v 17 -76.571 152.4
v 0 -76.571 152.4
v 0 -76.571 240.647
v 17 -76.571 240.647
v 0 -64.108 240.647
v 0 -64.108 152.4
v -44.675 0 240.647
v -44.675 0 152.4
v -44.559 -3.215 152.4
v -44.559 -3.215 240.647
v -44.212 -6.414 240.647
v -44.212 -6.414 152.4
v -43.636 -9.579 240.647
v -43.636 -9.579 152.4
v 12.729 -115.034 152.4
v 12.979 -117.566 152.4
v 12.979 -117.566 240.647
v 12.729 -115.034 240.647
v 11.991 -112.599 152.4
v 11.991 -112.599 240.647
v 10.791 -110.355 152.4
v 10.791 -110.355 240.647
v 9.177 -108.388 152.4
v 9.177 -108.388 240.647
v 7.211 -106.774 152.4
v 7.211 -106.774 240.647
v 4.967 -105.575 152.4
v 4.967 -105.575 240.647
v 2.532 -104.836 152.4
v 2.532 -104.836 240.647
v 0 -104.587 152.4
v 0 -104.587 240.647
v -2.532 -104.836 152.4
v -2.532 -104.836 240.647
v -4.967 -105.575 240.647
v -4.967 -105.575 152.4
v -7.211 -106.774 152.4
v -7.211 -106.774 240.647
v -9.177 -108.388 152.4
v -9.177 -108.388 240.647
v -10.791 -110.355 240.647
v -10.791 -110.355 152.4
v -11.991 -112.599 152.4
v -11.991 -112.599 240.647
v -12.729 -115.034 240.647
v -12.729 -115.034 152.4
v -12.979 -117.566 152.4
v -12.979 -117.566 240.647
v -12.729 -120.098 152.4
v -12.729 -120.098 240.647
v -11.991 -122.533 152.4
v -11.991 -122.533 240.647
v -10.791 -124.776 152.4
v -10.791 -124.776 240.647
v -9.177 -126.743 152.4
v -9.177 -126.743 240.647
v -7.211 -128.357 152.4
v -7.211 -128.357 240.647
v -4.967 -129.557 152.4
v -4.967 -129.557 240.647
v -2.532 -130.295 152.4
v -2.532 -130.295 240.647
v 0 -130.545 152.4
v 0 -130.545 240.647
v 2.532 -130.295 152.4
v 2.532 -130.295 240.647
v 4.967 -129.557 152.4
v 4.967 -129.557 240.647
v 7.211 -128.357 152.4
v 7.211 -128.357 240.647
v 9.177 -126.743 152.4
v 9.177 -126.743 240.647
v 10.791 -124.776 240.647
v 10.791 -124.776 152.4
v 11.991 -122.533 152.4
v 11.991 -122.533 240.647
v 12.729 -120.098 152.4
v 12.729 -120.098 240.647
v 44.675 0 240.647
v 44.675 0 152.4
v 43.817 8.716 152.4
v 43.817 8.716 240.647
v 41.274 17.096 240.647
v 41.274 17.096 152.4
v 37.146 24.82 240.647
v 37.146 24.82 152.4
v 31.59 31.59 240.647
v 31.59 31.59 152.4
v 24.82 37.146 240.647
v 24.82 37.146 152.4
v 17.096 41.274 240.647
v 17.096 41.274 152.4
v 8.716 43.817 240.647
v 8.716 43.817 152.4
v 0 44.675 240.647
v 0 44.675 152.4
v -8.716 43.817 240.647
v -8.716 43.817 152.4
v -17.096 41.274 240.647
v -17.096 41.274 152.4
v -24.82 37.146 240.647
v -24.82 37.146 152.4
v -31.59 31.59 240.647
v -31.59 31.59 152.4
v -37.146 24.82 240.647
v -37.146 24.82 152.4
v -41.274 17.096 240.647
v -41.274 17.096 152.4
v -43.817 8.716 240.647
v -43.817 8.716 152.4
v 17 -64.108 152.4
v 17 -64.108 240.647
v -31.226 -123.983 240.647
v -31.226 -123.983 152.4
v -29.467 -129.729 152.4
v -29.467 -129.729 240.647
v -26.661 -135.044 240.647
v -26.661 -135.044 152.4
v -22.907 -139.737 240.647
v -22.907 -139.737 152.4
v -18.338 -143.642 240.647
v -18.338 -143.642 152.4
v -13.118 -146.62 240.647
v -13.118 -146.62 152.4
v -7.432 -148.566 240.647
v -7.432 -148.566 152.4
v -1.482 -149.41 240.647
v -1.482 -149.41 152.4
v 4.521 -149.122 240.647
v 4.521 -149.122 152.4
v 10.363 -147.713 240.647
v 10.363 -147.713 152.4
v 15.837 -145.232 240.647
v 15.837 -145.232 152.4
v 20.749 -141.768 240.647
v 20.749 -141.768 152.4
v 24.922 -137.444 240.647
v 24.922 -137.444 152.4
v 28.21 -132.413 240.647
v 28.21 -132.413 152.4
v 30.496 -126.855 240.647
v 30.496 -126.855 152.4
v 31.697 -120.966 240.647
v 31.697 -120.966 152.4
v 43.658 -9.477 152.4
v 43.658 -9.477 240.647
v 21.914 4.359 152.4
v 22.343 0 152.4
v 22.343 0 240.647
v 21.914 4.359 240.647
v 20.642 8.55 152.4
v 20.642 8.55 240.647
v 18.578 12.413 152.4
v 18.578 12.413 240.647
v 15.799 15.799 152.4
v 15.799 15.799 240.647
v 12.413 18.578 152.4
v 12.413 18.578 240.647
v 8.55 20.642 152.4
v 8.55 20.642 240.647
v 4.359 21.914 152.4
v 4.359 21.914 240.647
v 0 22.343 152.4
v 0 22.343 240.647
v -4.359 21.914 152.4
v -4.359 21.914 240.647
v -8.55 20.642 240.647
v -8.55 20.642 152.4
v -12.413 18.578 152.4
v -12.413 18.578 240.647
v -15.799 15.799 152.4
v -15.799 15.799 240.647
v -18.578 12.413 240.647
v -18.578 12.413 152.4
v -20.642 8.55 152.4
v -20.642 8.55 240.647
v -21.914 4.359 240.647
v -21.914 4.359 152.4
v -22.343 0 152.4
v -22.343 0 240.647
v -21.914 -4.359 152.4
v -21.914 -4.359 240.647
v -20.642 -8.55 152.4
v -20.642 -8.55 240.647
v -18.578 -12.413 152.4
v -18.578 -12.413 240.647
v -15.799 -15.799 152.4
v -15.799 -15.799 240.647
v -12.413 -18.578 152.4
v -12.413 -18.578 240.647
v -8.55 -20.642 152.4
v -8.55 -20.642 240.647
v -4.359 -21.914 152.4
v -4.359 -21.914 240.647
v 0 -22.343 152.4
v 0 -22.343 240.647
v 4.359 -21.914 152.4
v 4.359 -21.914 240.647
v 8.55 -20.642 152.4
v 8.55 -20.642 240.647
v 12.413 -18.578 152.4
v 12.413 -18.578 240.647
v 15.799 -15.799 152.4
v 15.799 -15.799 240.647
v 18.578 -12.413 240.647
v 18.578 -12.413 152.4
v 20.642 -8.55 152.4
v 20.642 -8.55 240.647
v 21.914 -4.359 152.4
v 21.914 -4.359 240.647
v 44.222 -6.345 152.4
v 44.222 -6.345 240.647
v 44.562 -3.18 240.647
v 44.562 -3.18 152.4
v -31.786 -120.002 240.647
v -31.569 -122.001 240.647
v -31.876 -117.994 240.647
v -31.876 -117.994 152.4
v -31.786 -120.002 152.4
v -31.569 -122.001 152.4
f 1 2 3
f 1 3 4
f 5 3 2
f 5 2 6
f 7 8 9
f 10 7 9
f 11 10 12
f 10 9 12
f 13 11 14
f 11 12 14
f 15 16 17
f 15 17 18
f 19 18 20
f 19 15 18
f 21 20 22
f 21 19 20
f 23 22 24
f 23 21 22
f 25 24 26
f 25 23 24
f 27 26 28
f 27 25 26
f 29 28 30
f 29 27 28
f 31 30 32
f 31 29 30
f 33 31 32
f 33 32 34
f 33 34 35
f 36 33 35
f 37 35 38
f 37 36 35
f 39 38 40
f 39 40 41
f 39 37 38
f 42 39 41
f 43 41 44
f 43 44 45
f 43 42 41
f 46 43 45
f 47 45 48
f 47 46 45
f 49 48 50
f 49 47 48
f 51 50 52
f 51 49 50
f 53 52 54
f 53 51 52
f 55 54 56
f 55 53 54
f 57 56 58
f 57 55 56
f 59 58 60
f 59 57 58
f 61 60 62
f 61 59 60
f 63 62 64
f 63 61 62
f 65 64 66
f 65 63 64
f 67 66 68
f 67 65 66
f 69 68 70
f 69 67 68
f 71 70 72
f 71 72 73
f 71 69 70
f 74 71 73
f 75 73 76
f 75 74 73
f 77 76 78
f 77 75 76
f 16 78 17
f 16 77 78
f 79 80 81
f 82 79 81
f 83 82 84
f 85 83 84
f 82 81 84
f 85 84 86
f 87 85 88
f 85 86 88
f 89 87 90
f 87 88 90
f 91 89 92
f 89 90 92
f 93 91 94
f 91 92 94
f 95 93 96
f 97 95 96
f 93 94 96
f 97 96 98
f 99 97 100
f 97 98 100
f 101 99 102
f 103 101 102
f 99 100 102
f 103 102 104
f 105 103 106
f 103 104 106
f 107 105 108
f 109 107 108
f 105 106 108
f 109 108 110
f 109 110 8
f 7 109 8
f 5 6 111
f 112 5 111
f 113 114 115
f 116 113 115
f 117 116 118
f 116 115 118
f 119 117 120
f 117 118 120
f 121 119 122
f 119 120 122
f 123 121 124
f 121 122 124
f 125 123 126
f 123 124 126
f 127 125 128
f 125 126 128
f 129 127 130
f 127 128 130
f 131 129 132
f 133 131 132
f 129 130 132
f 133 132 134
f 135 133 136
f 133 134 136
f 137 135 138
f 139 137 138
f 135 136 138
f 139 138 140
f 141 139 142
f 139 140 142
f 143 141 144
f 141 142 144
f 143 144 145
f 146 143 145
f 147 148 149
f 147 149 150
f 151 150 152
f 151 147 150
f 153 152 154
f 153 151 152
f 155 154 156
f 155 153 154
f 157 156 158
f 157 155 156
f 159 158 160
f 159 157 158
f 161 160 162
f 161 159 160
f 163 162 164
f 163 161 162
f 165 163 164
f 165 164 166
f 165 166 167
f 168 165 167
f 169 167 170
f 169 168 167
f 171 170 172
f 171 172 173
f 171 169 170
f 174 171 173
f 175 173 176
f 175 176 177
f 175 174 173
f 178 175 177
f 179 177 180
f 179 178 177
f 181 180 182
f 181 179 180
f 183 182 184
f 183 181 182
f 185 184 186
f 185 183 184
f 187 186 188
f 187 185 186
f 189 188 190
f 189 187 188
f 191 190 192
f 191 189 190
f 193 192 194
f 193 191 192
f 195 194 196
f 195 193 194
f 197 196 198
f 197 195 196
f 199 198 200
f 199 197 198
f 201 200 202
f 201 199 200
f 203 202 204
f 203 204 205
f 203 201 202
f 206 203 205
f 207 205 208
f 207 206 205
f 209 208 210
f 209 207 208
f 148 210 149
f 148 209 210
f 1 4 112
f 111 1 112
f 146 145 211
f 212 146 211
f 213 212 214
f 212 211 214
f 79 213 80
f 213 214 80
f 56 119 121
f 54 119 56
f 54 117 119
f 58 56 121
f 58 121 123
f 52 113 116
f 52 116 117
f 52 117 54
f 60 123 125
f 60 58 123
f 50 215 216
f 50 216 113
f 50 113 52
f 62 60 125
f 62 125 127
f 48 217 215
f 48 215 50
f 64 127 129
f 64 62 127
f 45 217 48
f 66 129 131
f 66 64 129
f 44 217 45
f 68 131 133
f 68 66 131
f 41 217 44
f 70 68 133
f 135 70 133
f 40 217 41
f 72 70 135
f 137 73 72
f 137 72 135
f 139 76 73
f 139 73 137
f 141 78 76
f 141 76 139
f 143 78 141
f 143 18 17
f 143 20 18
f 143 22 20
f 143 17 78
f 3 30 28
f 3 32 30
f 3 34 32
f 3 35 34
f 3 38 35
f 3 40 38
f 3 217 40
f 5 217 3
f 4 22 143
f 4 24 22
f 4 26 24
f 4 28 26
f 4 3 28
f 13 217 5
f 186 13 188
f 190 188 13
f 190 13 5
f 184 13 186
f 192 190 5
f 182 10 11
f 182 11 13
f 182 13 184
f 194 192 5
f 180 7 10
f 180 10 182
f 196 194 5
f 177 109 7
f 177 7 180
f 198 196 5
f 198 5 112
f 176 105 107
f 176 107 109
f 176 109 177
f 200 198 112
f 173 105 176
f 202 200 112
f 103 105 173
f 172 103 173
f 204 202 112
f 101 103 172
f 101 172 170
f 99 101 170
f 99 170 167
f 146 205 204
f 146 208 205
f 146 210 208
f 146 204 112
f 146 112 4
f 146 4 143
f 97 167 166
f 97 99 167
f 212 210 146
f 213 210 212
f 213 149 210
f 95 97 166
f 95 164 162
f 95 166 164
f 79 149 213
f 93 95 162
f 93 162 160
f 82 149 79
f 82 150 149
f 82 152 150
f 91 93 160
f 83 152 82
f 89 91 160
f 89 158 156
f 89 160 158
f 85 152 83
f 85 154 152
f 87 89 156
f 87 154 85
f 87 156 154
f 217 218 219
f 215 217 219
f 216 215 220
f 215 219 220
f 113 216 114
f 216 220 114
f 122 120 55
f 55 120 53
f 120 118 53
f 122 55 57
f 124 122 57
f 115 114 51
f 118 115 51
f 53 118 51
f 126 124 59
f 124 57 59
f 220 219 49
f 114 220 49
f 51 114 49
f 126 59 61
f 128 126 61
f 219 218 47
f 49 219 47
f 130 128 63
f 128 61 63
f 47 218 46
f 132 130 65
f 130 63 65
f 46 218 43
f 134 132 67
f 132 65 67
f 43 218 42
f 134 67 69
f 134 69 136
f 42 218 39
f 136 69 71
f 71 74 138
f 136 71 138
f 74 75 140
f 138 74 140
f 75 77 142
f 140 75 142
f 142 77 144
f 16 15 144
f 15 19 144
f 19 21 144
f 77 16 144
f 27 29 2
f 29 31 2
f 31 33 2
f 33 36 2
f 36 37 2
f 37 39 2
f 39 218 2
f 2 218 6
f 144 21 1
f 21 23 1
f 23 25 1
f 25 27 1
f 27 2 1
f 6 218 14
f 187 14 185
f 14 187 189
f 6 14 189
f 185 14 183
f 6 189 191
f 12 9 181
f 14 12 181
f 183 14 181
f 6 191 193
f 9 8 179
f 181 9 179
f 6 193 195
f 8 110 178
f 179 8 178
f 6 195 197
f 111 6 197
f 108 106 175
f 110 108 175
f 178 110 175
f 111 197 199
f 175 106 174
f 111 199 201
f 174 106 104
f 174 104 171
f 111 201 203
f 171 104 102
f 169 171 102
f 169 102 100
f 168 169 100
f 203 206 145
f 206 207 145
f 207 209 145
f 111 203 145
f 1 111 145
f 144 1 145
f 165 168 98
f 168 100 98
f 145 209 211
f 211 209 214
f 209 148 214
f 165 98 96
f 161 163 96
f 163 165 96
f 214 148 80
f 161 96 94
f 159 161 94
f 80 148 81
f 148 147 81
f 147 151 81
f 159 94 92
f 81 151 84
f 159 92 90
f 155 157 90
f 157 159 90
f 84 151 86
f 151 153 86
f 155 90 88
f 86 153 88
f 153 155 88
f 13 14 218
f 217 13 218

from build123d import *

# Parameters (mm, degrees)
F1_R     = 22.343097
F1_W     = 16.999803
F1_H     = 12.462489
F1_R_2   = 12.978797
F2_DEPTH = 88.24669


with BuildPart() as f2:
    # F1 (on offset) → F2 (new body)
    with BuildSketch(Plane.XY.offset(152.4)):
        with BuildLine():
            Line((43.658363, -9.476985), (44.675116, 0))
            ThreePointArc((44.675116, 0), (0, 44.675116), (-44.675116, 0))
            Line((-44.675116, 0), (-43.636028, -9.579299))
            ThreePointArc((-43.636028, -9.579299), (0.052362, -44.675085), (43.658363, -9.476985))
        make_face()
        Circle(F1_R, mode=Mode.SUBTRACT)
        with BuildLine():
            ThreePointArc((43.658363, -9.476985), (44.4202, -4.765685), (44.675116, 0))
            Line((44.675116, 0), (43.658363, -9.476985))
        make_face()
        with BuildLine():
            Line((-43.636028, -9.579299), (-44.675116, 0))
            ThreePointArc((-44.675116, 0), (-44.414584, -4.817745), (-43.636028, -9.579299))
        make_face()
        with BuildLine():
            Line((31.697058, -120.966422), (43.658363, -9.476985))
            ThreePointArc((43.658363, -9.476985), (0.052362, -44.675085), (-43.636028, -9.579299))
            Line((-43.636028, -9.579299), (-31.876086, -117.9937))
            ThreePointArc((-31.876086, -117.9937), (-0.213975, -85.687518), (31.878959, -117.565759))
            ThreePointArc((31.878959, -117.565759), (31.833451, -119.268521), (31.697058, -120.966422))
        make_face()
        with Locations((8.499901, -70.339483)):
            Rectangle(F1_W, F1_H, mode=Mode.SUBTRACT)
        with BuildLine():
            ThreePointArc((-31.226448, -123.982685), (1.526377, -149.408154), (31.697058, -120.966422))
            ThreePointArc((31.697058, -120.966422), (31.833451, -119.268521), (31.878959, -117.565759))
            ThreePointArc((31.878959, -117.565759), (-0.213975, -85.687518), (-31.876086, -117.9937))
            Line((-31.876086, -117.9937), (-31.226448, -123.982685))
        make_face()
        with Locations((0, -117.565759)):
            Circle(F1_R_2, mode=Mode.SUBTRACT)
        with BuildLine():
            Line((-31.226448, -123.982685), (-31.876086, -117.9937))
            ThreePointArc((-31.876086, -117.9937), (-31.69305, -121.003572), (-31.226448, -123.982685))
        make_face()
    extrude(amount=F2_DEPTH)


solid = f2.part
